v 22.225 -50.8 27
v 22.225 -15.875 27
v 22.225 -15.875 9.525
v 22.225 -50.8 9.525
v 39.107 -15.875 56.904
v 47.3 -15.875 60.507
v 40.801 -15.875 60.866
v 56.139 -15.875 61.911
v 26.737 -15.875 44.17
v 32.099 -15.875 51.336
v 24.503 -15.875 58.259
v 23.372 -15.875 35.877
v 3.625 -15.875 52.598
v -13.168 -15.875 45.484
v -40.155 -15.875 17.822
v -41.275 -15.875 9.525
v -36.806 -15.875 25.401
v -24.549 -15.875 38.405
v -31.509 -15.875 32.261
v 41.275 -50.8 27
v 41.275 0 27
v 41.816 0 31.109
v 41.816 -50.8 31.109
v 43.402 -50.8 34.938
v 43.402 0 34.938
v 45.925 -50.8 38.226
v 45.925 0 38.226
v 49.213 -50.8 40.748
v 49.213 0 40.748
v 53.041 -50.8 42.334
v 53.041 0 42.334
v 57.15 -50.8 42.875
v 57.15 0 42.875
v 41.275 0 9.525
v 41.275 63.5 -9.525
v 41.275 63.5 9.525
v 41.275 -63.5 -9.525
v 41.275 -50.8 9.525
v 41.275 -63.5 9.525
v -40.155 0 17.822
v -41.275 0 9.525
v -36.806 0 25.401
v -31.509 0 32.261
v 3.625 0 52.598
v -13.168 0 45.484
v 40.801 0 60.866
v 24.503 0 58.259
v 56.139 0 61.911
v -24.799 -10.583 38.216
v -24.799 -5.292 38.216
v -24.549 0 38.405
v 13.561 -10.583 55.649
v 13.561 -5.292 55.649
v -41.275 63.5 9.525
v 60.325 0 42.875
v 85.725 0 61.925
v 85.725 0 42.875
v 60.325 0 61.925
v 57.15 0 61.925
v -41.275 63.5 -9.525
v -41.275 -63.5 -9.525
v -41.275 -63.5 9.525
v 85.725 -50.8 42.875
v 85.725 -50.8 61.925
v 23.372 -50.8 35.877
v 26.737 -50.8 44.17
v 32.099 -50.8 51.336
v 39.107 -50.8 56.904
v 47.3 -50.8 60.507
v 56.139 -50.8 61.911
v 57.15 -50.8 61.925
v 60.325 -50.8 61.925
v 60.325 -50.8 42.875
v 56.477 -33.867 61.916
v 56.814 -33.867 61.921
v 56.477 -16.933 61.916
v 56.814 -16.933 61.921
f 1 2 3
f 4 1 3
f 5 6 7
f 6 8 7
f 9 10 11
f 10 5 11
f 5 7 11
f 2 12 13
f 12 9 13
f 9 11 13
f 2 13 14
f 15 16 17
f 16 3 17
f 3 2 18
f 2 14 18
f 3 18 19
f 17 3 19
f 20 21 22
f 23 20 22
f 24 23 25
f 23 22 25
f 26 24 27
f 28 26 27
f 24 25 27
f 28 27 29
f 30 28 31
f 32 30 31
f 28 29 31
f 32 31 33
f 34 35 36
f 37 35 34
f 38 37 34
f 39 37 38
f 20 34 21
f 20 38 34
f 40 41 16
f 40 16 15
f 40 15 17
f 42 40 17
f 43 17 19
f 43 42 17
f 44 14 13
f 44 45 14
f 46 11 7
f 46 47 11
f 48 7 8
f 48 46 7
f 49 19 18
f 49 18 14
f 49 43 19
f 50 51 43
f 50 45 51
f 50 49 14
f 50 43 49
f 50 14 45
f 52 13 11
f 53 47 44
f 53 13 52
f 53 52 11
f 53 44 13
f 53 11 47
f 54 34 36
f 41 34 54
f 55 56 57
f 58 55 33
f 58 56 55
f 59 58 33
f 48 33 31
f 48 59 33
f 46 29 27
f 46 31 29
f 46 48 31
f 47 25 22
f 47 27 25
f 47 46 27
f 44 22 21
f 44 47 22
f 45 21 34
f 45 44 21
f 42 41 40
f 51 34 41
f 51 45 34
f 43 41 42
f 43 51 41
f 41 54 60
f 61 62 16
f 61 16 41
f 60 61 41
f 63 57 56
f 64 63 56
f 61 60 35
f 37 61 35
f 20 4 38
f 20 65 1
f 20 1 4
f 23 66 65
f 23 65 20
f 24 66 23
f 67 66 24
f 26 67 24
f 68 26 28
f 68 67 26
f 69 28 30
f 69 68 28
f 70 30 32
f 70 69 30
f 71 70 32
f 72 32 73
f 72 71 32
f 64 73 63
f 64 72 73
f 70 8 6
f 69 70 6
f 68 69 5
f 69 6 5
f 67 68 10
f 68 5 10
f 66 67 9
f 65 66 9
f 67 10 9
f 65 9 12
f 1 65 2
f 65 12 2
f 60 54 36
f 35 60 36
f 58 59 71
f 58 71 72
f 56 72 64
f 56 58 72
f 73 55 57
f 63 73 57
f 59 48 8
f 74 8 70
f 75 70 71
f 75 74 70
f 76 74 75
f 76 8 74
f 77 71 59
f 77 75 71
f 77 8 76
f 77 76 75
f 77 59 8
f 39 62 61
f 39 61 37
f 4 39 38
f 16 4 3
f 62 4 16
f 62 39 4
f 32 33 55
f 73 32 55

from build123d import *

# Parameters (mm, degrees)
F1_DEPTH = 63.5
F0_W     = 25.4
F0_H     = 19.0500033191
F2_DEPTH = 50.8
F3_DEPTH = 15.875


# Not quite as in the source:
# - ends of sketch curves that miss each other by under 0.0002 mm in the source are joined


with BuildPart() as f1:
    # F0 (on Front) → F1 (new body, symmetric)
    with BuildSketch(Plane.XZ):
        Polygon((-41.275, 9.525), (-41.275, -9.525), (41.275, -9.525), (41.275, 9.525), (22.225, 9.525), align=None)
    extrude(amount=F1_DEPTH, both=True)

    # F0 (on Front) → F2 (join)
    with BuildSketch(Plane.XZ):
        with BuildLine():
            Line((22.225, 9.525), (41.275, 9.525))
            Line((41.275, 9.525), (41.275, 27.0002))
            ThreePointArc((41.275, 27.0002), (45.9246798487, 38.2255201513), (57.15, 42.8752))
            Line((57.15, 42.8752), (60.325, 42.8751966809))
            Line((60.325, 42.8751966809), (60.325, 61.9252))
            Line((60.325, 61.9252), (57.15, 61.9252))
            add(Edge.make_bspline(
                [(56.1392549791, 61.9105712312), (56.4777228602, 61.916713038), (56.8146554612, 61.9215892093), (57.15, 61.9252)],
                knots=[110.5401994714, 110.5401994714, 110.5401994714, 110.5401994714, 111.5045361635, 111.5045361635, 111.5045361635, 111.5045361635], degree=3))
            ThreePointArc((56.1392549791, 61.9105712312), (32.0994920725, 51.3359284167), (22.225, 27.0002))
            Line((22.225, 27.0002), (22.225, 9.525))
        make_face()
        with Locations((73.025, 52.4001983404)):
            Rectangle(F0_W, F0_H)
    extrude(amount=F2_DEPTH)

    # F0 (on Front) → F3 (join)
    with BuildSketch(Plane.XZ):
        with BuildLine():
            add(Edge.make_bspline(
                [(-41.275, 9.525), (-41.6296994967, 43.8725434099), (17.341283892, 61.2065468529), (56.1392549791, 61.9105712312)],
                knots=[0, 0, 0, 0, 110.5401994714, 110.5401994714, 110.5401994714, 110.5401994714], degree=3))
            Line((-41.275, 9.525), (22.225, 9.525))
            Line((22.225, 9.525), (22.225, 27.0002))
            ThreePointArc((22.225, 27.0002), (32.0994920725, 51.3359284167), (56.1392549791, 61.9105712312))
        make_face()
    extrude(amount=F3_DEPTH)


solid = f1.part
